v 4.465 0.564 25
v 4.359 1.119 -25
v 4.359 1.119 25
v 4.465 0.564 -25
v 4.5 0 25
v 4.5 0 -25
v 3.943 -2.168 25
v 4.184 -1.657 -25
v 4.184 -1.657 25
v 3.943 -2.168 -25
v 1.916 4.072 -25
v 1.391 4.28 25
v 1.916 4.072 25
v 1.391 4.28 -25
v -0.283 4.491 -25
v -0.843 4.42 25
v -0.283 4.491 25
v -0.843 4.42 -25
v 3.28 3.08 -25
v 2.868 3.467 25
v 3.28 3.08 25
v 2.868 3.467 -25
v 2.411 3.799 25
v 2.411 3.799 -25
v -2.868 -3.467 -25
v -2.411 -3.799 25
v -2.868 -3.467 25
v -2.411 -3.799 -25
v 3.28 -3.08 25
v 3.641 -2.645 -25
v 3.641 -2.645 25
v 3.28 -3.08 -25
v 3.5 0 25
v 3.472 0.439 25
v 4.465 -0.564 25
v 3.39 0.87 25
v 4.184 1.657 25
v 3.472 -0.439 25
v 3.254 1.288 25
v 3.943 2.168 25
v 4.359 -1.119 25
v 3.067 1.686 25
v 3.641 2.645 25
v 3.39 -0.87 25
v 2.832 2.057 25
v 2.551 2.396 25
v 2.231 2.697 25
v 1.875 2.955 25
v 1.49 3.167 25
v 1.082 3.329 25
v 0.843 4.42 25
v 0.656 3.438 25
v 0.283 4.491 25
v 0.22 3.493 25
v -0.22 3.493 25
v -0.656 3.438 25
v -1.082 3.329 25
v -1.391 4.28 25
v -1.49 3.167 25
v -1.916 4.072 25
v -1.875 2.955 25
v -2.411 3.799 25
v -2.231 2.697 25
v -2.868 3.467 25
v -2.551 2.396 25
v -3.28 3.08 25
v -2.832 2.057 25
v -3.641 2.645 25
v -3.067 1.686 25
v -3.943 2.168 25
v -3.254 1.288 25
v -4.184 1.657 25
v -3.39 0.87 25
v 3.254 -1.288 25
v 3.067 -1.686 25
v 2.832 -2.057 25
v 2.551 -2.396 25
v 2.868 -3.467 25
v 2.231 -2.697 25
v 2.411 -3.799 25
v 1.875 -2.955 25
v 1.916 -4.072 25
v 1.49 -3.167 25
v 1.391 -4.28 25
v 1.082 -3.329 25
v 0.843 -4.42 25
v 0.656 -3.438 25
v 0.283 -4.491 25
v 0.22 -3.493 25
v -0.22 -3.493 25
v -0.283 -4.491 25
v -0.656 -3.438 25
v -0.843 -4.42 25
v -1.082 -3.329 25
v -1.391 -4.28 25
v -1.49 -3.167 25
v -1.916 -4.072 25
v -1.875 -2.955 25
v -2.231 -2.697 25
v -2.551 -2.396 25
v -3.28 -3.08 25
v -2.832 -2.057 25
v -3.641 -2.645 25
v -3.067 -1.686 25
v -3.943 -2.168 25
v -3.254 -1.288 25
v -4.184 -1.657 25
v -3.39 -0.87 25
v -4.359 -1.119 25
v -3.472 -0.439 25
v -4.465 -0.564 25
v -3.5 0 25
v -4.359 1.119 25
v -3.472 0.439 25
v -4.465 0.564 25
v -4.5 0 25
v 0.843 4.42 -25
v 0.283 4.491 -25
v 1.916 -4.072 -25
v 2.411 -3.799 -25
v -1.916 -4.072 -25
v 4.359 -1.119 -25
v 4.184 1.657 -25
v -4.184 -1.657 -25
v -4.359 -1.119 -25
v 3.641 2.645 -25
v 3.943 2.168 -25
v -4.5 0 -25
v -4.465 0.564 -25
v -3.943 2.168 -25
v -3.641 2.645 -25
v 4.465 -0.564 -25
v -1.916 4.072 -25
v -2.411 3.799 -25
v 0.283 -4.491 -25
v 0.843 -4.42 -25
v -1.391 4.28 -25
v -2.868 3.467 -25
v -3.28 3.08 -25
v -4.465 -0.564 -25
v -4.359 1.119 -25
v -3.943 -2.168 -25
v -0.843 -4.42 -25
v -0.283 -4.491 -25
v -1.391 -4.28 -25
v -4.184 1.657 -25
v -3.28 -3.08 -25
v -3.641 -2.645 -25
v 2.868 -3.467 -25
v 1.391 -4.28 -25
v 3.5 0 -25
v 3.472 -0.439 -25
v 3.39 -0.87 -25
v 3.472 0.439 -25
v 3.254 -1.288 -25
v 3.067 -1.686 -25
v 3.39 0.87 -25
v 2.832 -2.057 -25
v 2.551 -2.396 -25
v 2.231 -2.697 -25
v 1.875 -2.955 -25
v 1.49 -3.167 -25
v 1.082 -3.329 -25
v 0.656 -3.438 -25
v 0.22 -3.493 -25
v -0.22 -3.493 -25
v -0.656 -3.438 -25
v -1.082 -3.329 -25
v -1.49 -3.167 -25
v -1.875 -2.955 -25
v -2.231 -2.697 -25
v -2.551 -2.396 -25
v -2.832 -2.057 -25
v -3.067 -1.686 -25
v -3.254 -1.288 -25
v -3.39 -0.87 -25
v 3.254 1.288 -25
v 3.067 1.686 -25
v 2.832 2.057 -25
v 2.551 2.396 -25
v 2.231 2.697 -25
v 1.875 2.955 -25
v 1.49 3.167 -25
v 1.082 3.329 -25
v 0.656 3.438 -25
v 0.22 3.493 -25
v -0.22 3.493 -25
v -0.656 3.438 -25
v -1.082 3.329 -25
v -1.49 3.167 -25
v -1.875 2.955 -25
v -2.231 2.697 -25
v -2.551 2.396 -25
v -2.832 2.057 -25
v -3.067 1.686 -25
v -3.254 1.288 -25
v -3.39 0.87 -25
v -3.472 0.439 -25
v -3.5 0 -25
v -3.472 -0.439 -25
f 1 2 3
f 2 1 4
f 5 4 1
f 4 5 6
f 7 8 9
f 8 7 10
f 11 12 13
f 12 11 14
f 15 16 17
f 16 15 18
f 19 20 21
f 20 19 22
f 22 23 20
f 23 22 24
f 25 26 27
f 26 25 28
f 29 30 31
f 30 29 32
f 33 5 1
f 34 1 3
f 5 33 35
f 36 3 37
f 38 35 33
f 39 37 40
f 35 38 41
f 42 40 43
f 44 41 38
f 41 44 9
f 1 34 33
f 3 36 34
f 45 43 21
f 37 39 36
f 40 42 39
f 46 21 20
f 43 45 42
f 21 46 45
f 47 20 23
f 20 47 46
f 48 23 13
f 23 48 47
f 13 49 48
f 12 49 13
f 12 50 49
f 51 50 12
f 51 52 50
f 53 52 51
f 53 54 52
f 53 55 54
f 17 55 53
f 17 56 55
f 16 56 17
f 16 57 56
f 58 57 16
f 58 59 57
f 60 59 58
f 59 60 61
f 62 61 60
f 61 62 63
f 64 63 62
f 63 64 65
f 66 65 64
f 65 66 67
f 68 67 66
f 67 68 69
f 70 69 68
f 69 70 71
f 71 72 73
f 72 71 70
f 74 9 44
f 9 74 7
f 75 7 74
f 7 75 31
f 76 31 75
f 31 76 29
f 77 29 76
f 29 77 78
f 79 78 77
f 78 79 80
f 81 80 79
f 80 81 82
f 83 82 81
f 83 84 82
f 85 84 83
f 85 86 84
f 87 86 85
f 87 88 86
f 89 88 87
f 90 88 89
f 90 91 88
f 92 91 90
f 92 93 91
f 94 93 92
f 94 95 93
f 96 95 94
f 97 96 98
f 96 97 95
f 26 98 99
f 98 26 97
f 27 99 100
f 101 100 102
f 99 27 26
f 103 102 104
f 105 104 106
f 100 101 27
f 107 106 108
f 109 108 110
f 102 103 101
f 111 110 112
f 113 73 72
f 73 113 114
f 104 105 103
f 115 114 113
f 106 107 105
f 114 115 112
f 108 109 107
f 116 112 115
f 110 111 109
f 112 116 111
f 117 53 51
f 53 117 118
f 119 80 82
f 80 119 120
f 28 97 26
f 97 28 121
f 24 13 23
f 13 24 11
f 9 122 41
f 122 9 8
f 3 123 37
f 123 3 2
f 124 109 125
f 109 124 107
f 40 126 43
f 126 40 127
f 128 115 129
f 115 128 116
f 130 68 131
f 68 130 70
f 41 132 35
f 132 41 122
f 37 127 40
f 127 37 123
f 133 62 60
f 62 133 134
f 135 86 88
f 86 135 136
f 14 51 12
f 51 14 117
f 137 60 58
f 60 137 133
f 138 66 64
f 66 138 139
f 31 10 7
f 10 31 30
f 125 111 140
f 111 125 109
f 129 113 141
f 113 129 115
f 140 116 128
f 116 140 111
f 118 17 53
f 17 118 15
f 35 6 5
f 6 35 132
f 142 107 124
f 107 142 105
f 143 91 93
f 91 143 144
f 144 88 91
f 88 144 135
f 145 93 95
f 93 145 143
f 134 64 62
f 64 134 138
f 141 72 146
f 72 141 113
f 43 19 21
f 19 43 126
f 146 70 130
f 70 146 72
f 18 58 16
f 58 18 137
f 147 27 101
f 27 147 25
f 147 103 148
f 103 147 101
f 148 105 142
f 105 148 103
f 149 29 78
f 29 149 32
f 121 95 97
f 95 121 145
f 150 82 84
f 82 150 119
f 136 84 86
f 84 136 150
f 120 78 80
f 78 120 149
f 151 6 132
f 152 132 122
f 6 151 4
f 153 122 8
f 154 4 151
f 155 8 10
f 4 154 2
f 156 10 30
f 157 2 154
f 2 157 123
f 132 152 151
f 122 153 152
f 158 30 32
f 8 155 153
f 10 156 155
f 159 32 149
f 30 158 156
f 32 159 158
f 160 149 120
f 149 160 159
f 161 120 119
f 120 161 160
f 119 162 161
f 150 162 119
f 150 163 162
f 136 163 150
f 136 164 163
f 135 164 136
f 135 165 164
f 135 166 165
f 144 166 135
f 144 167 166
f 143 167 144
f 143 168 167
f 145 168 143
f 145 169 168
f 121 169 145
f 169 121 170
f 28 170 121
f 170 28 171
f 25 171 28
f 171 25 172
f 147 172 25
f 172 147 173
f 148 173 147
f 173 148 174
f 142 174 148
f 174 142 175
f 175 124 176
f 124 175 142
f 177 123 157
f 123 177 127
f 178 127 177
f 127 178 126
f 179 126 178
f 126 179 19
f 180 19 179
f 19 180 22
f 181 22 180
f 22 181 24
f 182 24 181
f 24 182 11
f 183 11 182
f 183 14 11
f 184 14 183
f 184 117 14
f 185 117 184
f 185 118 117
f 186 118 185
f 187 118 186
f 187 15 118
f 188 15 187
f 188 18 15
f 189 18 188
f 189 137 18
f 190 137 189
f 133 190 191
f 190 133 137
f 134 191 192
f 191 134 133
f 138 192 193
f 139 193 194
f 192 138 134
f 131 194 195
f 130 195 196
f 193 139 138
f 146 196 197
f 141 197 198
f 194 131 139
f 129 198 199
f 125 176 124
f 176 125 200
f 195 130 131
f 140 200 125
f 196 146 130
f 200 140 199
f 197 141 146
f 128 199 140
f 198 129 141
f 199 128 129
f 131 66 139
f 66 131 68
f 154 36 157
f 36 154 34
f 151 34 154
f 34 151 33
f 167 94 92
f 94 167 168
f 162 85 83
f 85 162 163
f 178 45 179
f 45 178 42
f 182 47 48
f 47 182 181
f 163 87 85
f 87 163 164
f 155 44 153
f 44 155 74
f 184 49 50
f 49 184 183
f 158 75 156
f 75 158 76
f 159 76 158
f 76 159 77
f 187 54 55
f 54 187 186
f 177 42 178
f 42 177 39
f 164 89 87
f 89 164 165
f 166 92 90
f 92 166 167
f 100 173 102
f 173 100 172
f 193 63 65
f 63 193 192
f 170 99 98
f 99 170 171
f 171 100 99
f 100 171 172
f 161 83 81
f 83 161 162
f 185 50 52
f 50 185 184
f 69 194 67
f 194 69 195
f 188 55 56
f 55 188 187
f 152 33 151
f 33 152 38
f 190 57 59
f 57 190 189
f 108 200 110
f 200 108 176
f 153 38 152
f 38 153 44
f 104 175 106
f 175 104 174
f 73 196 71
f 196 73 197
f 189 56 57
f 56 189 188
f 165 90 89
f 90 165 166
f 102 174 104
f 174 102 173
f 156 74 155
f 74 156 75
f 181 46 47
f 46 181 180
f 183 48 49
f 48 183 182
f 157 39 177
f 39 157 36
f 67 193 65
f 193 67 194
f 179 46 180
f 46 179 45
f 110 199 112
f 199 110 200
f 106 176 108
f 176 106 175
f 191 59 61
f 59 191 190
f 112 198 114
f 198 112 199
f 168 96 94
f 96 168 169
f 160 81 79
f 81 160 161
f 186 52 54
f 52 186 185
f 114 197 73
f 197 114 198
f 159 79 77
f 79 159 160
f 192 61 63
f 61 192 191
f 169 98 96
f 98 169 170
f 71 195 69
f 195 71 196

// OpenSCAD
$fn = 50;


difference() {
	union() {
		translate(v = [0, 0, -25.0000000000]) {
			cylinder(h = 50, r = 4.5000000000);
		}
	}
	union() {
		translate(v = [0, 0, -100.0000000000]) {
			cylinder(h = 200, r = 3.5000000000);
		}
	}
}
